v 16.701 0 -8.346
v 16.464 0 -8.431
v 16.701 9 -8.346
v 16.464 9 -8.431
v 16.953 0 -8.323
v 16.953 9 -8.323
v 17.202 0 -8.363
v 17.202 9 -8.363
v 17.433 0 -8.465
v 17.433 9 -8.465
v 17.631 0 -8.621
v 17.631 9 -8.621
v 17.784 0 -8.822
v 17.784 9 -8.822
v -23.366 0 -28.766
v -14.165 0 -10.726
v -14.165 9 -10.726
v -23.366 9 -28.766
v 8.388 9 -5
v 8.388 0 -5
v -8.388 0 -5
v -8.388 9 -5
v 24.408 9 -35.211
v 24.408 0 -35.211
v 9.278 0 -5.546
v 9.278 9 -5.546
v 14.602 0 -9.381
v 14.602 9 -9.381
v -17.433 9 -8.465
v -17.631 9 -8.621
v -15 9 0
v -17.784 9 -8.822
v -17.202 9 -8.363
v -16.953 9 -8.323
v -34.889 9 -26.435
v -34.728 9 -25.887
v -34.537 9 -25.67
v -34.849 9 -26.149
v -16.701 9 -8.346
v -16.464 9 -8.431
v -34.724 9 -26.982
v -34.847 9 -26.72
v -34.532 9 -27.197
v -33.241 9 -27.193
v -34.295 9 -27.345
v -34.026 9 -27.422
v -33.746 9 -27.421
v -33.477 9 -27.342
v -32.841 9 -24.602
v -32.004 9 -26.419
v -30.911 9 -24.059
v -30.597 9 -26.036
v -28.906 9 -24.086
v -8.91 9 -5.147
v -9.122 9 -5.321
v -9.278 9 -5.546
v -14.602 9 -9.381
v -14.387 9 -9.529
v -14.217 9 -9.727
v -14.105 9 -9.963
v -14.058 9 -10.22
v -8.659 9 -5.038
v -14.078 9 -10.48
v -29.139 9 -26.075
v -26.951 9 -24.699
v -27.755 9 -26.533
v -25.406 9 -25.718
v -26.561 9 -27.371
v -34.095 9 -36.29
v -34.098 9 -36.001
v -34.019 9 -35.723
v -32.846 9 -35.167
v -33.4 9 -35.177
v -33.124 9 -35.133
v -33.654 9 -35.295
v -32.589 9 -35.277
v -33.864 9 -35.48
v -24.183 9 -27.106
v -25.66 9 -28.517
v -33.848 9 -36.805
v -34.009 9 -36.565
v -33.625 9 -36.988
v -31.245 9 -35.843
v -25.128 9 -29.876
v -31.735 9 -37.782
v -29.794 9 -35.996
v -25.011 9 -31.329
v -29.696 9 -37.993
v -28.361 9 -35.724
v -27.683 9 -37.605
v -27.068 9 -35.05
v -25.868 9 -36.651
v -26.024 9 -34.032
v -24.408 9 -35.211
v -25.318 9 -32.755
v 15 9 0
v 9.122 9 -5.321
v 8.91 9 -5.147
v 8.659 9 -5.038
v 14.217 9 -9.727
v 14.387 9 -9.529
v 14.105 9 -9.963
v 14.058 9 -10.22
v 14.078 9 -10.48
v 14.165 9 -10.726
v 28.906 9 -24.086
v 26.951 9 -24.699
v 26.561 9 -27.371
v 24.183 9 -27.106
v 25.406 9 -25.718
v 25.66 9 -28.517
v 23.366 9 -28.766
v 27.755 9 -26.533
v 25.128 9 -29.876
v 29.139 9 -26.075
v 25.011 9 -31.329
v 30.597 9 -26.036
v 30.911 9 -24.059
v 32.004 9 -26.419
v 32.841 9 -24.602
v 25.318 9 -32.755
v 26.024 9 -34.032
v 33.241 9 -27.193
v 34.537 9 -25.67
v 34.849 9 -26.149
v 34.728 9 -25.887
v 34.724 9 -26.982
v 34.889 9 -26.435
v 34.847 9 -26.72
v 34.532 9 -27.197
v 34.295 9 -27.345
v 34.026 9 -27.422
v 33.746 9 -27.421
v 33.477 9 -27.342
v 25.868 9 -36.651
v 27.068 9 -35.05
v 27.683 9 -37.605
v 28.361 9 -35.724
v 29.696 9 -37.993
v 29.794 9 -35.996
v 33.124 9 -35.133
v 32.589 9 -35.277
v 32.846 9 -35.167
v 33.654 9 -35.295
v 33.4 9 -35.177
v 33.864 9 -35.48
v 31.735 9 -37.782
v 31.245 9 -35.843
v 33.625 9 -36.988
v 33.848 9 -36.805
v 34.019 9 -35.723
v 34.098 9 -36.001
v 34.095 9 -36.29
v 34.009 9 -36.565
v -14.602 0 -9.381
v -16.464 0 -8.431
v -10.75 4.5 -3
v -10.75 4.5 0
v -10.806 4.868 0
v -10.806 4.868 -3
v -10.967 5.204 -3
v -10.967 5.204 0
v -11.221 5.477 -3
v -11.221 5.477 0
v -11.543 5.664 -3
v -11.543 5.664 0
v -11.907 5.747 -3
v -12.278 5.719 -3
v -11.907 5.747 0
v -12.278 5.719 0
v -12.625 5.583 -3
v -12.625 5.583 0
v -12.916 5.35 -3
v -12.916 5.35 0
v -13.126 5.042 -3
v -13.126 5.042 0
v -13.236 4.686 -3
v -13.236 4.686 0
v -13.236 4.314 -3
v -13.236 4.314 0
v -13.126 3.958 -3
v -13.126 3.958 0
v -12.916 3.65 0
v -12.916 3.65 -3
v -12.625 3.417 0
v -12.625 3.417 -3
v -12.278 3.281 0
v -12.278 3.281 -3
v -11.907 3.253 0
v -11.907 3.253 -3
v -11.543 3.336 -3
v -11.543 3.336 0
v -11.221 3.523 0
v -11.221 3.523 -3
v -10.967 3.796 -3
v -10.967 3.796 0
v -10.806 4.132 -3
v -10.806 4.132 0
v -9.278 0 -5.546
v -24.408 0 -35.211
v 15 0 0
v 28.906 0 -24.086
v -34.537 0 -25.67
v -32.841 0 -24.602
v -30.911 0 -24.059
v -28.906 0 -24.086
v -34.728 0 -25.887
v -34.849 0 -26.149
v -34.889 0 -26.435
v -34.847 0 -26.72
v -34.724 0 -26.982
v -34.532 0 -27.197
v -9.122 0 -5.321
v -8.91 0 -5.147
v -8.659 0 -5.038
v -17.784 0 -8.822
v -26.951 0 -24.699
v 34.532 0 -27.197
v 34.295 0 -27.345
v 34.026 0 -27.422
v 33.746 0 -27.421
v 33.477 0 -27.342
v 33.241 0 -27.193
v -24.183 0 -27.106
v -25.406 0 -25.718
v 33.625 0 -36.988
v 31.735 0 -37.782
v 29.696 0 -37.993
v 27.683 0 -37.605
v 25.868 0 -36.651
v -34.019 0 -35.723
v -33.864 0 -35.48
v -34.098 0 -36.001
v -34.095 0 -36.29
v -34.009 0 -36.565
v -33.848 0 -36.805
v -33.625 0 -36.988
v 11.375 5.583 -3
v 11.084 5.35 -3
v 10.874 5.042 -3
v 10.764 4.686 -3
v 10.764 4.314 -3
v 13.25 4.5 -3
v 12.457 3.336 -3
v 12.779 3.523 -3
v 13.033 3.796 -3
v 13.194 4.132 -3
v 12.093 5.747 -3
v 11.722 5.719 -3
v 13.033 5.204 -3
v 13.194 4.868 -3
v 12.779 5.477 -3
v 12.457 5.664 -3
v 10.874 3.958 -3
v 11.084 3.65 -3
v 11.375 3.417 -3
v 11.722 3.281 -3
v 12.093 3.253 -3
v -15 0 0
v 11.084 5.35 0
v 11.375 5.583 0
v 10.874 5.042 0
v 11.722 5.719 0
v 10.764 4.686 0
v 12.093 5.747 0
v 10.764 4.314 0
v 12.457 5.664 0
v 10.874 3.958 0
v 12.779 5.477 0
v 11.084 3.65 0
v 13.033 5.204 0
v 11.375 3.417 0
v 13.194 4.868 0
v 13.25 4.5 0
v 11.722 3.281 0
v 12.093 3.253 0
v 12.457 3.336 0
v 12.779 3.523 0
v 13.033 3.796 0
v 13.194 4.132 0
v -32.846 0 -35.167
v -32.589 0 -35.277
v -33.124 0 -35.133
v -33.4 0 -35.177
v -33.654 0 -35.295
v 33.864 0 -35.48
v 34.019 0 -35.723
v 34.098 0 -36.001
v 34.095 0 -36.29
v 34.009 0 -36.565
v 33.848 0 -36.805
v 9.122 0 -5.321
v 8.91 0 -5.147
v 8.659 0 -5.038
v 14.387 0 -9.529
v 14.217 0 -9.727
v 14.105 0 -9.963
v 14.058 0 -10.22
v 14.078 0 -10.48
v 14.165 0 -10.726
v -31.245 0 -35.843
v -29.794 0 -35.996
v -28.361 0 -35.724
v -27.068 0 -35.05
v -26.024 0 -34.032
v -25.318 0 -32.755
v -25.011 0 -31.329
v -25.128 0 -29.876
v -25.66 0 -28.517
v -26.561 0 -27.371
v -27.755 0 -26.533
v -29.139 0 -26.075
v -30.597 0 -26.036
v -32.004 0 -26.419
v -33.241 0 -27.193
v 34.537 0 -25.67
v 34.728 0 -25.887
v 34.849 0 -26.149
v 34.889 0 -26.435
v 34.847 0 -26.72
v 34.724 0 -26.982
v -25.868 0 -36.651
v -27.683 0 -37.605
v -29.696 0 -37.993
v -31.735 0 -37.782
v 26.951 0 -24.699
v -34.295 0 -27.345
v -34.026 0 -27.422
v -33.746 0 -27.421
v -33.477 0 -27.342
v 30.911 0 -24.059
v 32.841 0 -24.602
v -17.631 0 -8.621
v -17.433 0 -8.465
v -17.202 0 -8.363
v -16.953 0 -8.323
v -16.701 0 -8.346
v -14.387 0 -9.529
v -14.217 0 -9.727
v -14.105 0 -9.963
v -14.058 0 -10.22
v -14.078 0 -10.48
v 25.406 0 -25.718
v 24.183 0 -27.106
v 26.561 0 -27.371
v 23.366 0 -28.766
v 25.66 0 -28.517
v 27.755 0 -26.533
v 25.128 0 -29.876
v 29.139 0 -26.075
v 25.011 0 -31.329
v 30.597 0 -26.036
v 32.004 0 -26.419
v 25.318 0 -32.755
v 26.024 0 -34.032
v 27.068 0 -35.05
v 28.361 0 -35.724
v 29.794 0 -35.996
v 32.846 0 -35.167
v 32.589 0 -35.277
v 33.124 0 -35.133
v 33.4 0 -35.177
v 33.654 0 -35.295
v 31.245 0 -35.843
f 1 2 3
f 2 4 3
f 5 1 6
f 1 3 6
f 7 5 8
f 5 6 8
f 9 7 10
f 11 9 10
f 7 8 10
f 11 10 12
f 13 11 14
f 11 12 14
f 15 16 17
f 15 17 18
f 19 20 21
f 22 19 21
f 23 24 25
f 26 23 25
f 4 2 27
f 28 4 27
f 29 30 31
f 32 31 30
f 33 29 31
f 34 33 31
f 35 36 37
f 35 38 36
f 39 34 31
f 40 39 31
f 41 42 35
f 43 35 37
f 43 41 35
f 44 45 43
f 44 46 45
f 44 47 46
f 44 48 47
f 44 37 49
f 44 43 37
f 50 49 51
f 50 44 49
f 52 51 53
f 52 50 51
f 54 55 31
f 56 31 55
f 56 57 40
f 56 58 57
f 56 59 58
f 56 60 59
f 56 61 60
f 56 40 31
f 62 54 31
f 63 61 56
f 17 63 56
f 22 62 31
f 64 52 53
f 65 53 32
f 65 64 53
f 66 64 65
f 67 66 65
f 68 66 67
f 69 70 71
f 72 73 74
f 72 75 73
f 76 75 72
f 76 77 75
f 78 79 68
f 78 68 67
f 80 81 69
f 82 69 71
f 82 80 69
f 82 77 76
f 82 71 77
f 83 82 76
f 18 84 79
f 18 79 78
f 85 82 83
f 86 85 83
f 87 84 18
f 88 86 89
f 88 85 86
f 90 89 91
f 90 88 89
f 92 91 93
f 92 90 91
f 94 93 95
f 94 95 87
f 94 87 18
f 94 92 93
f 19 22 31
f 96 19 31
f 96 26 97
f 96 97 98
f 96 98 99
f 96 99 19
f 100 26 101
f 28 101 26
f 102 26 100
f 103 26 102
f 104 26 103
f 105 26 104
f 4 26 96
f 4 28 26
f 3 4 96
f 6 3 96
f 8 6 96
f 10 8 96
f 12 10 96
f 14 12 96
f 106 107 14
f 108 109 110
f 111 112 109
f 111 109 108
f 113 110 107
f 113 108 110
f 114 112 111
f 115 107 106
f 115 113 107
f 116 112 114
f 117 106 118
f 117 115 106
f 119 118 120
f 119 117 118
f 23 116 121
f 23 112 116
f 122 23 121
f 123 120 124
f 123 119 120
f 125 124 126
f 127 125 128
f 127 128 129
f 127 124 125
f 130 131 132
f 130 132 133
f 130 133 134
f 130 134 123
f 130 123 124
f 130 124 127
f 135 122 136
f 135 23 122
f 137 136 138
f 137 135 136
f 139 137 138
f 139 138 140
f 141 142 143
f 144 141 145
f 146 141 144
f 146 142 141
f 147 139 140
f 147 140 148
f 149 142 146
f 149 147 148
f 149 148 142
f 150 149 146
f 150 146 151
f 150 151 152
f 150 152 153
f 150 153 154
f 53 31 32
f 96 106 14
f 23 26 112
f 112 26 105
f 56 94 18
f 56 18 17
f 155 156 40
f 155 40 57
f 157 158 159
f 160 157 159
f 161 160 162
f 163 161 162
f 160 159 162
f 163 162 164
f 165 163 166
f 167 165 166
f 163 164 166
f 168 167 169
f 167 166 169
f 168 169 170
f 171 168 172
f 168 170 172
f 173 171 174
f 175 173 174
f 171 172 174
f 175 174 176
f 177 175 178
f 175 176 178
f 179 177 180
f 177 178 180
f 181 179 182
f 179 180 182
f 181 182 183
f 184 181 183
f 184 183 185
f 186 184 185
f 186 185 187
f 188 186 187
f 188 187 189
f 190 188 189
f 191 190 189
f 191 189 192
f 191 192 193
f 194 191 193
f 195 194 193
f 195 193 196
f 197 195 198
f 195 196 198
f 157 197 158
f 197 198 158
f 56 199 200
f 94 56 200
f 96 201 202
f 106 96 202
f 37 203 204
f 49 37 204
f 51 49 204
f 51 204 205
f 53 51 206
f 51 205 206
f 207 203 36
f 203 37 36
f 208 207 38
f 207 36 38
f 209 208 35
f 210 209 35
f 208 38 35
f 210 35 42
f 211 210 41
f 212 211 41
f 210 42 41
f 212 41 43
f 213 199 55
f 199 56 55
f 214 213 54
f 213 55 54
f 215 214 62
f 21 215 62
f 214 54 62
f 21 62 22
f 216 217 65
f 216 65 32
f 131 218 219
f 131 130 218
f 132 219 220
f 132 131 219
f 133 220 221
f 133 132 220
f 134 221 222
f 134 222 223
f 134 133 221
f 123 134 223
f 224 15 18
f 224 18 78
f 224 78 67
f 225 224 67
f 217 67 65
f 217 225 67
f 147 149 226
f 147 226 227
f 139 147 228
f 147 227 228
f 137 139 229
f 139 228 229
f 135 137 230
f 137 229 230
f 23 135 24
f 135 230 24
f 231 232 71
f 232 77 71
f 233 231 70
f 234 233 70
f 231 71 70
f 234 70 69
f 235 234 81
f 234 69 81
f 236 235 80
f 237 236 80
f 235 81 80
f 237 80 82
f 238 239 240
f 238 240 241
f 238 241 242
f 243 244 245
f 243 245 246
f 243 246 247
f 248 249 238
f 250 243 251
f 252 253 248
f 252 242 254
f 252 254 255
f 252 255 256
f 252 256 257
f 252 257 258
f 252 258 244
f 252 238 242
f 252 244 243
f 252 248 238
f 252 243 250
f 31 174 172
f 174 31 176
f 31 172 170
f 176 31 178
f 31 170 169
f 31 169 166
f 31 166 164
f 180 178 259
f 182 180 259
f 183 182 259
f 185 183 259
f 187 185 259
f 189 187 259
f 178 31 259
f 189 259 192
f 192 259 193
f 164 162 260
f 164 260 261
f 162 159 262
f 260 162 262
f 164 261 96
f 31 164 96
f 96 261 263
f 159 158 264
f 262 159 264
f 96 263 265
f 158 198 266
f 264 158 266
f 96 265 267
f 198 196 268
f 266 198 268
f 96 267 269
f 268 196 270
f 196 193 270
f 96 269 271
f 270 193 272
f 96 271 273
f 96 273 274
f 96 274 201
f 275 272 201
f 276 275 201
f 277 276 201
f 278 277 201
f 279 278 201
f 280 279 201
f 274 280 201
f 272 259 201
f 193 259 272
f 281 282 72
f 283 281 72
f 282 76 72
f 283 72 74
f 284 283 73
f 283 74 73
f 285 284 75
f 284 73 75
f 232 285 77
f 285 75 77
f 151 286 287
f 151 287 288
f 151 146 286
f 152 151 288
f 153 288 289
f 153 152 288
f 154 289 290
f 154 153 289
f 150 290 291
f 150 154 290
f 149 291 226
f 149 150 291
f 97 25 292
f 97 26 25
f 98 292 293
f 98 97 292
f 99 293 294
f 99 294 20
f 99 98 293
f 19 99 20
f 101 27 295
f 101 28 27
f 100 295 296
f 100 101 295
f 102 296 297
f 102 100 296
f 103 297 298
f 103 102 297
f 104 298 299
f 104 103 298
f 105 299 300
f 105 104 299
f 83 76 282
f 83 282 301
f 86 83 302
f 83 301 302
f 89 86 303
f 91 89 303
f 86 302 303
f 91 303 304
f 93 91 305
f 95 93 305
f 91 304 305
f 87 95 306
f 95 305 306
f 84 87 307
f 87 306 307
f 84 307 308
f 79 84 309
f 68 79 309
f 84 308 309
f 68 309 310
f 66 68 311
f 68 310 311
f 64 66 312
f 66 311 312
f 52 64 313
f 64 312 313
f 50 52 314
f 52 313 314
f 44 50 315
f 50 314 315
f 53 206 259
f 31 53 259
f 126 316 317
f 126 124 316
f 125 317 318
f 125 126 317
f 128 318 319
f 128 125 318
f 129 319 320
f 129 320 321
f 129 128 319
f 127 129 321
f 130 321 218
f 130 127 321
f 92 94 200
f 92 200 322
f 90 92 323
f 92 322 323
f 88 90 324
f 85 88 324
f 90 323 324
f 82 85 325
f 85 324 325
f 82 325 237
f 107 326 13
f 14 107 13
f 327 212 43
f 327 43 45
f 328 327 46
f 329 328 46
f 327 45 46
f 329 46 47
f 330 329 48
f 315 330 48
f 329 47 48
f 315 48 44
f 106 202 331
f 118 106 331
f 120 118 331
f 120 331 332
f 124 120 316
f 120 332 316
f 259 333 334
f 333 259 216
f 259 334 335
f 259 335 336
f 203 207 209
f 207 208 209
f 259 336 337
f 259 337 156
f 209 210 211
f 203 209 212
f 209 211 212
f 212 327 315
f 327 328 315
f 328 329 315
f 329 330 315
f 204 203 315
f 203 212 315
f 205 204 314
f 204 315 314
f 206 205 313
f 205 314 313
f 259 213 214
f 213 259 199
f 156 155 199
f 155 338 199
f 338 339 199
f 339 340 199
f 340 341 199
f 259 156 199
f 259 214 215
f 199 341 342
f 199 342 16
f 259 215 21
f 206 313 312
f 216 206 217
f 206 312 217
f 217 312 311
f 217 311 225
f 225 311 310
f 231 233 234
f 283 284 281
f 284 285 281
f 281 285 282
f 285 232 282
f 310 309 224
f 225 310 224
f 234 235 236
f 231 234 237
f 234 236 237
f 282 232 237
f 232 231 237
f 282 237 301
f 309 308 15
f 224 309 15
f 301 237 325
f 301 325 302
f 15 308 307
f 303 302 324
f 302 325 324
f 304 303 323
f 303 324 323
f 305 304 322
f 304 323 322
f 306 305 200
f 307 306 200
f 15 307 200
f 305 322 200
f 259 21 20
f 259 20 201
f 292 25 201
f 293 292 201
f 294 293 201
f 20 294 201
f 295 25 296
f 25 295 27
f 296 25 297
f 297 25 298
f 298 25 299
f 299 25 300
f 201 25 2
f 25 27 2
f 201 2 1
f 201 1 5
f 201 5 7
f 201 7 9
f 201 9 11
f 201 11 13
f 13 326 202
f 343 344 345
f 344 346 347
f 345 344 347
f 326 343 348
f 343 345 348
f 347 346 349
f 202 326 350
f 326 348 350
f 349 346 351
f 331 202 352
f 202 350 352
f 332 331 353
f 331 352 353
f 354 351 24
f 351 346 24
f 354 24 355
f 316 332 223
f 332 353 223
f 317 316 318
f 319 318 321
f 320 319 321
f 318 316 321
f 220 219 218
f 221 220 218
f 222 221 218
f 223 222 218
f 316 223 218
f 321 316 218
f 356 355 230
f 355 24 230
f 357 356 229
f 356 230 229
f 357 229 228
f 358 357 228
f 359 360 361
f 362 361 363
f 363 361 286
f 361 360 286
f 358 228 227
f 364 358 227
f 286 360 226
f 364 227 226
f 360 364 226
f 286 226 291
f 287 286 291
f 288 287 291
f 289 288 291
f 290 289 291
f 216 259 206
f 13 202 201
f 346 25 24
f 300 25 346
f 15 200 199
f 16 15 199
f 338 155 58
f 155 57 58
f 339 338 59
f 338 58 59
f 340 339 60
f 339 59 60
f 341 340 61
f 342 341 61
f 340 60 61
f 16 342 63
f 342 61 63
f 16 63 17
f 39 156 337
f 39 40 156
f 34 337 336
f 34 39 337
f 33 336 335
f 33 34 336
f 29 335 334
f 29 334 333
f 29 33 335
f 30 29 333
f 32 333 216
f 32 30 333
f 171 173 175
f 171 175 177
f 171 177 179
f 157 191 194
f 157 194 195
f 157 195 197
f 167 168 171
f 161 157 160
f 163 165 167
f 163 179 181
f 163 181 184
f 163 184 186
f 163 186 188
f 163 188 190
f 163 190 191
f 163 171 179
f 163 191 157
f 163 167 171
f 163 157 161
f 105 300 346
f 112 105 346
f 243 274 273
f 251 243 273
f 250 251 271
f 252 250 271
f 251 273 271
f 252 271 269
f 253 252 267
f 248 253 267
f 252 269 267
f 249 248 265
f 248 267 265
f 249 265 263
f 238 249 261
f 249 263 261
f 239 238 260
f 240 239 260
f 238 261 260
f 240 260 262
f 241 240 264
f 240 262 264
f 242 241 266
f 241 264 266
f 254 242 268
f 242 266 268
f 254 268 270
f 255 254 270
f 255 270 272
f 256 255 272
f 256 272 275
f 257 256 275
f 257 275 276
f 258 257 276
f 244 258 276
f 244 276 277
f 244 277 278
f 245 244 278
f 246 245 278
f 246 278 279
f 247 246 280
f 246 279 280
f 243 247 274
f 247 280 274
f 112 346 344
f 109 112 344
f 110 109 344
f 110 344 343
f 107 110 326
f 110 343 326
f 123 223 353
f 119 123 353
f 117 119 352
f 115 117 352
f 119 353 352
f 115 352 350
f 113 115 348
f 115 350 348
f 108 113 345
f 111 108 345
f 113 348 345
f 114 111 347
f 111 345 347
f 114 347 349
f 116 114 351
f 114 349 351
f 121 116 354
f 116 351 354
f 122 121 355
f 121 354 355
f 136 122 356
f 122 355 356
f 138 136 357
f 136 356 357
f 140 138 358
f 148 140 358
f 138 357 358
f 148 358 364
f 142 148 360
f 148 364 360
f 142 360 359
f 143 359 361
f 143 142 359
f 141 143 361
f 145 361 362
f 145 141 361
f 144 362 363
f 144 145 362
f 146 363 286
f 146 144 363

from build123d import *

# Parameters (mm, degrees)
BOSS_EXTRUDE1_DEPTH = 9
FILLET3_R           = 1
SKETCH2_R           = 1.25
CUT_EXTRUDE1_DEPTH  = 3


with BuildPart() as part:
    # Sketch1 → Boss-Extrude1 (new body)
    with BuildSketch(Plane(origin=(0, 0, 0), x_dir=(1, 0, 0), z_dir=(0, 1, 0))):
        with BuildLine():
            Line((-15, 0), (15, 0))
            Line((15, 0), (28.906062556, 24.08600688))
            ThreePointArc((28.906062556, 24.08600688), (32.451975053, 24.443490384), (35.362311102, 26.500486732))
            Line((35.362311102, 26.500486732), (33.830222216, 27.786061952))
            ThreePointArc((33.830222216, 27.786061952), (25.016172377, 30.598176376), (33.265843673, 34.786061952))
            Line((33.265843673, 34.786061952), (34.572181143, 36.300486732))
            ThreePointArc((34.572181143, 36.300486732), (29.254107826, 37.9601469), (24.408479197, 35.211281884))
            Line((24.408479197, 35.211281884), (9, 5))
            Line((9, 5), (-9, 5))
            Line((-9, 5), (-24.408479197, 35.211281884))
            ThreePointArc((-24.408479197, 35.211281884), (-29.254107826, 37.9601469), (-34.572181143, 36.300486732))
            Line((-34.572181143, 36.300486732), (-33.265843673, 34.786061952))
            ThreePointArc((-33.265843673, 34.786061952), (-25.016172377, 30.598176376), (-33.830222216, 27.786061952))
            Line((-33.830222216, 27.786061952), (-35.362311102, 26.500486732))
            ThreePointArc((-35.362311102, 26.500486732), (-32.451975053, 24.443490384), (-28.906062556, 24.08600688))
            Line((-28.906062556, 24.08600688), (-15, 0))
        make_face()
        with BuildLine():
            Line((13.711166355, 9.835186109), (23.366165954, 28.765666577))
            ThreePointArc((23.366165954, 28.765666577), (24.748776454, 26.371322946), (26.950630684, 24.699099527))
            Line((26.950630684, 24.699099527), (17.309401077, 8))
            Line((17.309401077, 8), (13.711166355, 9.835186109))
        make_face(mode=Mode.SUBTRACT)
        with BuildLine():
            Line((-17.309401077, 8), (-13.711166355, 9.835186109))
            Line((-13.711166355, 9.835186109), (-23.366165954, 28.765666577))
            ThreePointArc((-23.366165954, 28.765666577), (-24.748776454, 26.371322946), (-26.950630684, 24.699099527))
            Line((-26.950630684, 24.699099527), (-17.309401077, 8))
        make_face(mode=Mode.SUBTRACT)
    extrude(amount=BOSS_EXTRUDE1_DEPTH)

    # Fillet3
    fillet3_edges = [part.edges().sort_by_distance(p)[0] for p in [
        (-33.265843673, 4.5, -34.786061952),
        (-34.572181143, 4.5, -36.300486732),
        (-33.830222216, 4.5, -27.786061952),
        (-35.362311102, 4.5, -26.500486732),
        (-17.309401077, 4.5, -8),
        (-13.711166355, 4.5, -9.835186109),
        (17.309401077, 4.5, -8),
        (13.711166355, 4.5, -9.835186109),
        (33.265843673, 4.5, -34.786061952),
        (34.572181143, 4.5, -36.300486732),
        (33.830222216, 4.5, -27.786061952),
        (35.362311102, 4.5, -26.500486732),
        (-9, 4.5, -5),
        (9, 4.5, -5),
    ]]
    fillet(fillet3_edges, radius=FILLET3_R - 0.0001)  # a hair under: the kernel refuses the full size

    # Sketch2 → Cut-Extrude1 (cut)
    with BuildSketch(Plane.XY):
        with Locations((-12, 4.5)):
            Circle(SKETCH2_R)
        with Locations((12, 4.5)):
            Circle(SKETCH2_R)
    extrude(amount=-CUT_EXTRUDE1_DEPTH, mode=Mode.SUBTRACT)


solid = part.part
